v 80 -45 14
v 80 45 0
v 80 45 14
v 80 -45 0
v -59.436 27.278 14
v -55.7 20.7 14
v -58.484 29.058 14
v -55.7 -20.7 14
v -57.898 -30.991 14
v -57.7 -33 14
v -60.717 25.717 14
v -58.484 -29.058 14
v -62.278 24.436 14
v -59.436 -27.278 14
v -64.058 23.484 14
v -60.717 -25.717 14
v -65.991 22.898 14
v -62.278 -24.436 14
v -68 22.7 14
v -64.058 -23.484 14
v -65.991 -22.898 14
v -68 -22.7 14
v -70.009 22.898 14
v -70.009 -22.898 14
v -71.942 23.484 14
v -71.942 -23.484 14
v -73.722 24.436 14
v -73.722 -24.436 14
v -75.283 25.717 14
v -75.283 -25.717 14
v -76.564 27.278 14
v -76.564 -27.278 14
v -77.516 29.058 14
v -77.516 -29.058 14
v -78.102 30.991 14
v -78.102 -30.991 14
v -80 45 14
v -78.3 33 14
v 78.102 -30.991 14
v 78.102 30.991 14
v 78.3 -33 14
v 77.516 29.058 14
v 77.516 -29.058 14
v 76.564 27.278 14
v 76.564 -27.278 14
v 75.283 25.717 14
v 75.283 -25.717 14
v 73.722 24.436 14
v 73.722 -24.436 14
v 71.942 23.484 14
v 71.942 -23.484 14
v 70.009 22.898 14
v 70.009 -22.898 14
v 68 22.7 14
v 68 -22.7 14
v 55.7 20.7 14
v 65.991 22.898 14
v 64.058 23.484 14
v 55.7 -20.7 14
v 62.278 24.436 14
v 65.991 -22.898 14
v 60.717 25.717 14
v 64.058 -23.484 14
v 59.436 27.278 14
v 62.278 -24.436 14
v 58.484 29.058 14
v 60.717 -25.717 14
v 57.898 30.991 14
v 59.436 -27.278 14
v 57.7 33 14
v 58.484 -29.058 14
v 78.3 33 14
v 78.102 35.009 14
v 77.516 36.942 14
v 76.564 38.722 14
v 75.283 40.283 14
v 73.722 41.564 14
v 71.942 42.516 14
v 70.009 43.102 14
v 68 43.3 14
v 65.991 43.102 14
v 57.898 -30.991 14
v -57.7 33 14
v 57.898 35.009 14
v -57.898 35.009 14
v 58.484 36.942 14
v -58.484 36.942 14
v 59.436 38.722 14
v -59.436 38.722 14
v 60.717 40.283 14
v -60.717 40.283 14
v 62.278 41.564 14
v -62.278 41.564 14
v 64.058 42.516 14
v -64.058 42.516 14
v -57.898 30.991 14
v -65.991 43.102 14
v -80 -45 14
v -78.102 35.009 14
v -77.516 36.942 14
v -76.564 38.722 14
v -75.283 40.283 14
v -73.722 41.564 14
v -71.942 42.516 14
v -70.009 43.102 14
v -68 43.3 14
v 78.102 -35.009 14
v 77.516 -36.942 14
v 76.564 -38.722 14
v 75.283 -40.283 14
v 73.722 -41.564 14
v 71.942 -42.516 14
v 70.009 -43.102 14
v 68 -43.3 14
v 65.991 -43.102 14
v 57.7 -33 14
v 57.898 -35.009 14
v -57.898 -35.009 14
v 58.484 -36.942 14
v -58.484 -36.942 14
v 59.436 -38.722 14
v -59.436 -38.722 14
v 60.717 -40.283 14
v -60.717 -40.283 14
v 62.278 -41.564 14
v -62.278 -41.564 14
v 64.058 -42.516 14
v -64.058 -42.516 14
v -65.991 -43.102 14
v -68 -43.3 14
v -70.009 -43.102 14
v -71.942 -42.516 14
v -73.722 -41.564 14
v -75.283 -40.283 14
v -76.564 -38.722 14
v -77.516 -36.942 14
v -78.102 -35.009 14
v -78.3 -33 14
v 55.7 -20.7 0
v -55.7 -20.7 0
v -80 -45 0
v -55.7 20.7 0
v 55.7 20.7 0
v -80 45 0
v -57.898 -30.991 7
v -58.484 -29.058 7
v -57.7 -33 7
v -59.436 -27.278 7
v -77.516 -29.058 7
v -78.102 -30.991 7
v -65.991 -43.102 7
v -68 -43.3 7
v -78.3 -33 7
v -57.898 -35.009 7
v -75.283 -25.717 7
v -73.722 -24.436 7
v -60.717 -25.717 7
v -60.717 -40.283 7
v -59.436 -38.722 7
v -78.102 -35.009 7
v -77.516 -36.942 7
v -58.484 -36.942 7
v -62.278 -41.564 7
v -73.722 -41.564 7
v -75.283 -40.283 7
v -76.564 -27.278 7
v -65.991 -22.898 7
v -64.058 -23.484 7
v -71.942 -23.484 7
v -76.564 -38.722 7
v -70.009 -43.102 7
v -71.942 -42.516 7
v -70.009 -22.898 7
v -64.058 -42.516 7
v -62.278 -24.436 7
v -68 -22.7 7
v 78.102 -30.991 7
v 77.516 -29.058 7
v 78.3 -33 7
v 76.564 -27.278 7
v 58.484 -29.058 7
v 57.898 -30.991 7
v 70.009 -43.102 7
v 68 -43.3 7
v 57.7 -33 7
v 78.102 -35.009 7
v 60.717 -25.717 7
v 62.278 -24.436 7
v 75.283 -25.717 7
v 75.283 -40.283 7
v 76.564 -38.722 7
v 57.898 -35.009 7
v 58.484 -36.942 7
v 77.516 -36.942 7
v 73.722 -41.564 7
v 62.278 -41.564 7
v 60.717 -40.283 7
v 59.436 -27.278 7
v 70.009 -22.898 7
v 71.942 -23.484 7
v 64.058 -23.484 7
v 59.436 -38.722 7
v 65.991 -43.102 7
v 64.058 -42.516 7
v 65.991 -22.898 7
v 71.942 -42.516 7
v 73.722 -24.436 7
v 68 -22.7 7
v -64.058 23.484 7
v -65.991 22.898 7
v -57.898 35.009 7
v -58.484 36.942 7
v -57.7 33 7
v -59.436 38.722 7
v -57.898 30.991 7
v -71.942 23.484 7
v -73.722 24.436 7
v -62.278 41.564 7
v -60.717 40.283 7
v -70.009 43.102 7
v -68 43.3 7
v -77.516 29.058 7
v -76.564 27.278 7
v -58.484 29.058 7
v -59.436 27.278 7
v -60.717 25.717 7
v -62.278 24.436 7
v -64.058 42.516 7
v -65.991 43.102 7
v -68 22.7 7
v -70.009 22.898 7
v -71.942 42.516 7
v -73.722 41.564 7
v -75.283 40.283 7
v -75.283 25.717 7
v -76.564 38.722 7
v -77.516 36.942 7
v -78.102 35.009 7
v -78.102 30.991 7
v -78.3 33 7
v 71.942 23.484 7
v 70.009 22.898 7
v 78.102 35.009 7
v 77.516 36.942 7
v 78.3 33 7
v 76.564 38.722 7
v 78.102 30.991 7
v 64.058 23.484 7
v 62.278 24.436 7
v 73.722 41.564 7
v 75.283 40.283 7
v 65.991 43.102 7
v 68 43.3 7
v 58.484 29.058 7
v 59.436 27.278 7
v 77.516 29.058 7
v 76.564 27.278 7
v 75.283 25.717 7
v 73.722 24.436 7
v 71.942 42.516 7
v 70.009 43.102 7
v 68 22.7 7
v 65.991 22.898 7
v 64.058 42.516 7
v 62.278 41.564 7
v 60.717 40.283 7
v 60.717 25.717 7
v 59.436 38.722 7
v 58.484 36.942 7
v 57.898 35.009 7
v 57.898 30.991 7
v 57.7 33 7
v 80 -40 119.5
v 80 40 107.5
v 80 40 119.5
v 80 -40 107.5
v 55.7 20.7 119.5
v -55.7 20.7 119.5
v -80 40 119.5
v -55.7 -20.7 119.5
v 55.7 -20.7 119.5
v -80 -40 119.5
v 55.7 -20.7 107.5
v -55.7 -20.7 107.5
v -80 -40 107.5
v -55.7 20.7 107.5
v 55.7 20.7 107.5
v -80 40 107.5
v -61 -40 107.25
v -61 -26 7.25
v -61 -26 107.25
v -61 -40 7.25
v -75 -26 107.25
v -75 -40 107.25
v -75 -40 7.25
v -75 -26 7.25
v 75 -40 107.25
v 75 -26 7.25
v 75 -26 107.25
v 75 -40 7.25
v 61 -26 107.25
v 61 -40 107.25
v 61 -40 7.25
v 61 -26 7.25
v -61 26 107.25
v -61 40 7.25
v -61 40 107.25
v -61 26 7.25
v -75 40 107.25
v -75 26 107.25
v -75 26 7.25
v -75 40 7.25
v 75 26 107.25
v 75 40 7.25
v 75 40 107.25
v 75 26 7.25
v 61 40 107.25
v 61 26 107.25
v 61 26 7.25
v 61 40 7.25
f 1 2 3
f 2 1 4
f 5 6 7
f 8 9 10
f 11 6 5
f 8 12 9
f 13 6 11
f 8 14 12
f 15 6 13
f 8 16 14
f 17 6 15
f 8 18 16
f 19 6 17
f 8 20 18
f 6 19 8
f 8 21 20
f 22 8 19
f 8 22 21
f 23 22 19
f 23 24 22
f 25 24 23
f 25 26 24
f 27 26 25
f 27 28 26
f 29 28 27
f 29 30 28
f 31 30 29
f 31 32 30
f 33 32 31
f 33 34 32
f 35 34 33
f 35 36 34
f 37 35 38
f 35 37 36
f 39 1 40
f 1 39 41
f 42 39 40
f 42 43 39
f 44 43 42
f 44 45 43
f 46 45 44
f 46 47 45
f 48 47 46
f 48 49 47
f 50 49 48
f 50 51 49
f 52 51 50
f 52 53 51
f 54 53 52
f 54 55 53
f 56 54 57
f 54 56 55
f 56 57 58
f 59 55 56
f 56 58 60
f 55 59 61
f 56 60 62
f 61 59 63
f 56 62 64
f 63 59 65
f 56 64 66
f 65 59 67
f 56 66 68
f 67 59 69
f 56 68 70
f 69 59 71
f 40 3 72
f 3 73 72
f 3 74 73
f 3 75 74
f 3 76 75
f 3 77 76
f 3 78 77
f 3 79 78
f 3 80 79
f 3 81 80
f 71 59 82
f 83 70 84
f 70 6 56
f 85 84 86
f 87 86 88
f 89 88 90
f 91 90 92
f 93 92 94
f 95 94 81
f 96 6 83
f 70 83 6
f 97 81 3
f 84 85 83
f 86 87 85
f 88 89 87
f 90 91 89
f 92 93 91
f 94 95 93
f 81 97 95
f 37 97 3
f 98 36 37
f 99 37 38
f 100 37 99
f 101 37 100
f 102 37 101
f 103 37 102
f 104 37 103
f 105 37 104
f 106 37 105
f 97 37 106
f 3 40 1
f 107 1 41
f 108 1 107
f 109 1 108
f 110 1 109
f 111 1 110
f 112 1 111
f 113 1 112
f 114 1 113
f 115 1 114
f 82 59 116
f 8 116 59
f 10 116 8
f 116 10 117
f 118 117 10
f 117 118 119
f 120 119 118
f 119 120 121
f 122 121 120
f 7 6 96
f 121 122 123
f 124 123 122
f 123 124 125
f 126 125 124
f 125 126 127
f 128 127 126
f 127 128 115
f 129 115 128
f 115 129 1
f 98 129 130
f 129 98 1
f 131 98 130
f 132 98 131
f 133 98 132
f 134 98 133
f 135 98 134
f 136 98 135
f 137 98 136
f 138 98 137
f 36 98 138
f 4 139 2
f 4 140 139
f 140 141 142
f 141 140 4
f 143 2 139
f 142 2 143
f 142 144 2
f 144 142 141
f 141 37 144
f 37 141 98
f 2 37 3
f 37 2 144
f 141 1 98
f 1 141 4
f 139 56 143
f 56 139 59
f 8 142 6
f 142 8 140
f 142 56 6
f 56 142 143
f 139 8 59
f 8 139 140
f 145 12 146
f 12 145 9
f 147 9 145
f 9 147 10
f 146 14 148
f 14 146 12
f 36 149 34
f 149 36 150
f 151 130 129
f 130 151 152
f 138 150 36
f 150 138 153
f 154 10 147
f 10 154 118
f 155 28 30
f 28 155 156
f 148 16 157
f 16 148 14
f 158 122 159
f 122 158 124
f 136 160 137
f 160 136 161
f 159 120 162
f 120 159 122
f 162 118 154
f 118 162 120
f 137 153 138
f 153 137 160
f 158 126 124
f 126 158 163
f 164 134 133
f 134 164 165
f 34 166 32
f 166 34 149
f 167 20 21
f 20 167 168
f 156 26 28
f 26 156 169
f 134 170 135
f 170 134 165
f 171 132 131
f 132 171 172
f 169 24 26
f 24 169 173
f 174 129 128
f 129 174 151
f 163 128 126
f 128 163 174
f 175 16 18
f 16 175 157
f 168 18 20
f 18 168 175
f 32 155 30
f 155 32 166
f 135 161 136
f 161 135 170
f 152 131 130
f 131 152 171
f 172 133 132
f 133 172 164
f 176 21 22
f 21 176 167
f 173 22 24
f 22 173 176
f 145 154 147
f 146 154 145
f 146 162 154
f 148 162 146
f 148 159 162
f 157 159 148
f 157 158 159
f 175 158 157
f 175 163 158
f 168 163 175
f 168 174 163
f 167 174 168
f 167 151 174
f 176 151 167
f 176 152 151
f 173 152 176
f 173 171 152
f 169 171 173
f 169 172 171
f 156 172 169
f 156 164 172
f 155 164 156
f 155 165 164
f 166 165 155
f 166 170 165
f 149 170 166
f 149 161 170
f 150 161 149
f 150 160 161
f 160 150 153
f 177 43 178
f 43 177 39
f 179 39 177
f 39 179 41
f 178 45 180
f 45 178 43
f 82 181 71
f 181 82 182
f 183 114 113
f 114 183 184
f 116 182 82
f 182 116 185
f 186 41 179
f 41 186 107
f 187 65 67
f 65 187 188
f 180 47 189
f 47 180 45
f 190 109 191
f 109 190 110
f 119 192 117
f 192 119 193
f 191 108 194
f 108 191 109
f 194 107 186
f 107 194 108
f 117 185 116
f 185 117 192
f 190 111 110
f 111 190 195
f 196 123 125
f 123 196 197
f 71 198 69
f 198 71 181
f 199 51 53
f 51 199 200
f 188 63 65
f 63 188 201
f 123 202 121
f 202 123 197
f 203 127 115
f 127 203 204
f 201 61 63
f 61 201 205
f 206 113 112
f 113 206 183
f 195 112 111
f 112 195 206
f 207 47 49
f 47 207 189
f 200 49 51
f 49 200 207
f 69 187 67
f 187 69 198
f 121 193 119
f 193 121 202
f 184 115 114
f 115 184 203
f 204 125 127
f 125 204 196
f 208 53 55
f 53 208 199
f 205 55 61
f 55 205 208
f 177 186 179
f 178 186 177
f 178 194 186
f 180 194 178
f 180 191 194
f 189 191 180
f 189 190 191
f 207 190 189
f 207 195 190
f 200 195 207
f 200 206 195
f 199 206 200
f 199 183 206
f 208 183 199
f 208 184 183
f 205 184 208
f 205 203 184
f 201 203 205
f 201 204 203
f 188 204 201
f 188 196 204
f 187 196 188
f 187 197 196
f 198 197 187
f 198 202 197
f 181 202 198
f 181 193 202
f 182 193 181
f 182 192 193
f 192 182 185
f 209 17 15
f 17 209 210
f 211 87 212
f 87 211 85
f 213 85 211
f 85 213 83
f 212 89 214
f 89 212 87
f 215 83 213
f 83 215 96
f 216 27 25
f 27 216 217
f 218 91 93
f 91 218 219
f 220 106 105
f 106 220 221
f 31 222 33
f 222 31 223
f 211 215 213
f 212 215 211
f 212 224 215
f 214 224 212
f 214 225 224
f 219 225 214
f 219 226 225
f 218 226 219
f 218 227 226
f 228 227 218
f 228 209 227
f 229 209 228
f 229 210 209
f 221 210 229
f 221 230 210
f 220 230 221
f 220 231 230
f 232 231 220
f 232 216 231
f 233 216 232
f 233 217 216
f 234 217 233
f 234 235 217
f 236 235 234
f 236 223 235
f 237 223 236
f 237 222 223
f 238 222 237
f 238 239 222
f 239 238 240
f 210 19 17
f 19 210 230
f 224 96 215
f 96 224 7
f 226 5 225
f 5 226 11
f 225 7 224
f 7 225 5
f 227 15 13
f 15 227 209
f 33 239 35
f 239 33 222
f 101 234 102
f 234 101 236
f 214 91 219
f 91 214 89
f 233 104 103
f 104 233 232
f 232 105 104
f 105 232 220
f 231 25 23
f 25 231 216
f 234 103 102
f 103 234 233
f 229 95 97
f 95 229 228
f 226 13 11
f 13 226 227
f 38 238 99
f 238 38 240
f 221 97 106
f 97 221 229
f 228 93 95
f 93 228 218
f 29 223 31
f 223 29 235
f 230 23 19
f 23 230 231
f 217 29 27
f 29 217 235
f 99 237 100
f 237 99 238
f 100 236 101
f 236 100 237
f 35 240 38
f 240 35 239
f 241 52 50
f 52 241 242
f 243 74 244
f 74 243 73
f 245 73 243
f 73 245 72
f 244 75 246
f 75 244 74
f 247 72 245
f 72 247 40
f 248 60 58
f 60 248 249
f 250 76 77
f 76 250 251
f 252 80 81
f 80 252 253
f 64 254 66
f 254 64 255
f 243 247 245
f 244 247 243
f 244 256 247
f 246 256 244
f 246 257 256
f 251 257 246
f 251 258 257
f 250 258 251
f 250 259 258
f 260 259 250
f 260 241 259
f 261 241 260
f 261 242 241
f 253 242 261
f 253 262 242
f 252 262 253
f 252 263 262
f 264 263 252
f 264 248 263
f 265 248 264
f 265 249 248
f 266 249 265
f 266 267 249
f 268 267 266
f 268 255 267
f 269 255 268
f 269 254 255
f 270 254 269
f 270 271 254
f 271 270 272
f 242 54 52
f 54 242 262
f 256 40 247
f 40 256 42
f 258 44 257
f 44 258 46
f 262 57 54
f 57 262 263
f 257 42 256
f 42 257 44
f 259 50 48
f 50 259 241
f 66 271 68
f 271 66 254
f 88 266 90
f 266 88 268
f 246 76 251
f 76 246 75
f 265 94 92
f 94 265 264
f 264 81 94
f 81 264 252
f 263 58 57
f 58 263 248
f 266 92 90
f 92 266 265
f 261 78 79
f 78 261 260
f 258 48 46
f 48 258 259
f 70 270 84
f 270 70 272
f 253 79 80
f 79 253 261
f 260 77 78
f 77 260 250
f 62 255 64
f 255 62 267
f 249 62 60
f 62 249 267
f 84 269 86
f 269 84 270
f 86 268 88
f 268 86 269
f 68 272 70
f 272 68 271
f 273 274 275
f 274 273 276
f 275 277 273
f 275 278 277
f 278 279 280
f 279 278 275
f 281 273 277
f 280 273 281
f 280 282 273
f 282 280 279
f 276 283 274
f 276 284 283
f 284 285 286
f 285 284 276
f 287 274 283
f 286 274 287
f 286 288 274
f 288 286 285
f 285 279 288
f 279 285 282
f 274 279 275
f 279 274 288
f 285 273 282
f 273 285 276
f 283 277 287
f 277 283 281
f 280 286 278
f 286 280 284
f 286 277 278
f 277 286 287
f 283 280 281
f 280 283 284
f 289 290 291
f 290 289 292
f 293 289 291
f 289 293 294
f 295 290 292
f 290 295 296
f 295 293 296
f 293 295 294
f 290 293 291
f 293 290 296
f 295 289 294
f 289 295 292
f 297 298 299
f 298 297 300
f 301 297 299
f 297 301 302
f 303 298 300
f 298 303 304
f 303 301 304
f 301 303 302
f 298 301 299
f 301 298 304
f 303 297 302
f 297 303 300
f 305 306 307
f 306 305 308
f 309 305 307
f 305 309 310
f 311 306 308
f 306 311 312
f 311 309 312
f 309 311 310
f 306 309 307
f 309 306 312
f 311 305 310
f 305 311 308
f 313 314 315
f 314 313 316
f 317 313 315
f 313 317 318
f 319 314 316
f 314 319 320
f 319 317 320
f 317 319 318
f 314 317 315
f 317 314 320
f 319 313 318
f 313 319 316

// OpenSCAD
$fn = 32;

// ------------------------------------------------------------------------
// Frame cube: base 160 x 90 mm, posts 100 mm tall
// Every part is its own module, assembly() places every instance.
// ------------------------------------------------------------------------

// --- part 1 ---
module base_frame() {
  difference() {
    translate([-80, -45, 0]) cube([160, 90, 14]);
    translate([-55.7, -20.7, -1]) cube([111.4, 41.4, 16]);
    translate([-68, -33, 7]) cylinder(h = 8, d = 20.6);
    translate([68, -33, 7]) cylinder(h = 8, d = 20.6);
    translate([-68, 33, 7]) cylinder(h = 8, d = 20.6);
    translate([68, 33, 7]) cylinder(h = 8, d = 20.6);
  }
}

// --- part 2 ---
module corner_post() {
  translate([-7, -7, 0]) cube([14, 14, 100]);
}

// --- part 3 ---
module top_frame() {
  difference() {
    translate([-80, -40, 0]) cube([160, 80, 12]);
    translate([-55.7, -20.7, -1]) cube([111.4, 41.4, 14]);
  }
}

// --- assembly ---
module assembly() {
  color([0.80, 0.24, 0.20]) translate([0, 0, 0]) rotate([0, 0, 0]) base_frame();
  color([0.20, 0.45, 0.75]) translate([-68, -33, 7.25]) rotate([0, 0, 0]) corner_post();
  color([0.25, 0.62, 0.32]) translate([68, -33, 7.25]) rotate([0, 0, 0]) corner_post();
  color([0.92, 0.70, 0.18]) translate([-68, 33, 7.25]) rotate([0, 0, 0]) corner_post();
  color([0.58, 0.35, 0.70]) translate([68, 33, 7.25]) rotate([0, 0, 0]) corner_post();
  color([0.16, 0.66, 0.66]) translate([0, 0, 107.5]) rotate([0, 0, 0]) top_frame();
}

assembly();
